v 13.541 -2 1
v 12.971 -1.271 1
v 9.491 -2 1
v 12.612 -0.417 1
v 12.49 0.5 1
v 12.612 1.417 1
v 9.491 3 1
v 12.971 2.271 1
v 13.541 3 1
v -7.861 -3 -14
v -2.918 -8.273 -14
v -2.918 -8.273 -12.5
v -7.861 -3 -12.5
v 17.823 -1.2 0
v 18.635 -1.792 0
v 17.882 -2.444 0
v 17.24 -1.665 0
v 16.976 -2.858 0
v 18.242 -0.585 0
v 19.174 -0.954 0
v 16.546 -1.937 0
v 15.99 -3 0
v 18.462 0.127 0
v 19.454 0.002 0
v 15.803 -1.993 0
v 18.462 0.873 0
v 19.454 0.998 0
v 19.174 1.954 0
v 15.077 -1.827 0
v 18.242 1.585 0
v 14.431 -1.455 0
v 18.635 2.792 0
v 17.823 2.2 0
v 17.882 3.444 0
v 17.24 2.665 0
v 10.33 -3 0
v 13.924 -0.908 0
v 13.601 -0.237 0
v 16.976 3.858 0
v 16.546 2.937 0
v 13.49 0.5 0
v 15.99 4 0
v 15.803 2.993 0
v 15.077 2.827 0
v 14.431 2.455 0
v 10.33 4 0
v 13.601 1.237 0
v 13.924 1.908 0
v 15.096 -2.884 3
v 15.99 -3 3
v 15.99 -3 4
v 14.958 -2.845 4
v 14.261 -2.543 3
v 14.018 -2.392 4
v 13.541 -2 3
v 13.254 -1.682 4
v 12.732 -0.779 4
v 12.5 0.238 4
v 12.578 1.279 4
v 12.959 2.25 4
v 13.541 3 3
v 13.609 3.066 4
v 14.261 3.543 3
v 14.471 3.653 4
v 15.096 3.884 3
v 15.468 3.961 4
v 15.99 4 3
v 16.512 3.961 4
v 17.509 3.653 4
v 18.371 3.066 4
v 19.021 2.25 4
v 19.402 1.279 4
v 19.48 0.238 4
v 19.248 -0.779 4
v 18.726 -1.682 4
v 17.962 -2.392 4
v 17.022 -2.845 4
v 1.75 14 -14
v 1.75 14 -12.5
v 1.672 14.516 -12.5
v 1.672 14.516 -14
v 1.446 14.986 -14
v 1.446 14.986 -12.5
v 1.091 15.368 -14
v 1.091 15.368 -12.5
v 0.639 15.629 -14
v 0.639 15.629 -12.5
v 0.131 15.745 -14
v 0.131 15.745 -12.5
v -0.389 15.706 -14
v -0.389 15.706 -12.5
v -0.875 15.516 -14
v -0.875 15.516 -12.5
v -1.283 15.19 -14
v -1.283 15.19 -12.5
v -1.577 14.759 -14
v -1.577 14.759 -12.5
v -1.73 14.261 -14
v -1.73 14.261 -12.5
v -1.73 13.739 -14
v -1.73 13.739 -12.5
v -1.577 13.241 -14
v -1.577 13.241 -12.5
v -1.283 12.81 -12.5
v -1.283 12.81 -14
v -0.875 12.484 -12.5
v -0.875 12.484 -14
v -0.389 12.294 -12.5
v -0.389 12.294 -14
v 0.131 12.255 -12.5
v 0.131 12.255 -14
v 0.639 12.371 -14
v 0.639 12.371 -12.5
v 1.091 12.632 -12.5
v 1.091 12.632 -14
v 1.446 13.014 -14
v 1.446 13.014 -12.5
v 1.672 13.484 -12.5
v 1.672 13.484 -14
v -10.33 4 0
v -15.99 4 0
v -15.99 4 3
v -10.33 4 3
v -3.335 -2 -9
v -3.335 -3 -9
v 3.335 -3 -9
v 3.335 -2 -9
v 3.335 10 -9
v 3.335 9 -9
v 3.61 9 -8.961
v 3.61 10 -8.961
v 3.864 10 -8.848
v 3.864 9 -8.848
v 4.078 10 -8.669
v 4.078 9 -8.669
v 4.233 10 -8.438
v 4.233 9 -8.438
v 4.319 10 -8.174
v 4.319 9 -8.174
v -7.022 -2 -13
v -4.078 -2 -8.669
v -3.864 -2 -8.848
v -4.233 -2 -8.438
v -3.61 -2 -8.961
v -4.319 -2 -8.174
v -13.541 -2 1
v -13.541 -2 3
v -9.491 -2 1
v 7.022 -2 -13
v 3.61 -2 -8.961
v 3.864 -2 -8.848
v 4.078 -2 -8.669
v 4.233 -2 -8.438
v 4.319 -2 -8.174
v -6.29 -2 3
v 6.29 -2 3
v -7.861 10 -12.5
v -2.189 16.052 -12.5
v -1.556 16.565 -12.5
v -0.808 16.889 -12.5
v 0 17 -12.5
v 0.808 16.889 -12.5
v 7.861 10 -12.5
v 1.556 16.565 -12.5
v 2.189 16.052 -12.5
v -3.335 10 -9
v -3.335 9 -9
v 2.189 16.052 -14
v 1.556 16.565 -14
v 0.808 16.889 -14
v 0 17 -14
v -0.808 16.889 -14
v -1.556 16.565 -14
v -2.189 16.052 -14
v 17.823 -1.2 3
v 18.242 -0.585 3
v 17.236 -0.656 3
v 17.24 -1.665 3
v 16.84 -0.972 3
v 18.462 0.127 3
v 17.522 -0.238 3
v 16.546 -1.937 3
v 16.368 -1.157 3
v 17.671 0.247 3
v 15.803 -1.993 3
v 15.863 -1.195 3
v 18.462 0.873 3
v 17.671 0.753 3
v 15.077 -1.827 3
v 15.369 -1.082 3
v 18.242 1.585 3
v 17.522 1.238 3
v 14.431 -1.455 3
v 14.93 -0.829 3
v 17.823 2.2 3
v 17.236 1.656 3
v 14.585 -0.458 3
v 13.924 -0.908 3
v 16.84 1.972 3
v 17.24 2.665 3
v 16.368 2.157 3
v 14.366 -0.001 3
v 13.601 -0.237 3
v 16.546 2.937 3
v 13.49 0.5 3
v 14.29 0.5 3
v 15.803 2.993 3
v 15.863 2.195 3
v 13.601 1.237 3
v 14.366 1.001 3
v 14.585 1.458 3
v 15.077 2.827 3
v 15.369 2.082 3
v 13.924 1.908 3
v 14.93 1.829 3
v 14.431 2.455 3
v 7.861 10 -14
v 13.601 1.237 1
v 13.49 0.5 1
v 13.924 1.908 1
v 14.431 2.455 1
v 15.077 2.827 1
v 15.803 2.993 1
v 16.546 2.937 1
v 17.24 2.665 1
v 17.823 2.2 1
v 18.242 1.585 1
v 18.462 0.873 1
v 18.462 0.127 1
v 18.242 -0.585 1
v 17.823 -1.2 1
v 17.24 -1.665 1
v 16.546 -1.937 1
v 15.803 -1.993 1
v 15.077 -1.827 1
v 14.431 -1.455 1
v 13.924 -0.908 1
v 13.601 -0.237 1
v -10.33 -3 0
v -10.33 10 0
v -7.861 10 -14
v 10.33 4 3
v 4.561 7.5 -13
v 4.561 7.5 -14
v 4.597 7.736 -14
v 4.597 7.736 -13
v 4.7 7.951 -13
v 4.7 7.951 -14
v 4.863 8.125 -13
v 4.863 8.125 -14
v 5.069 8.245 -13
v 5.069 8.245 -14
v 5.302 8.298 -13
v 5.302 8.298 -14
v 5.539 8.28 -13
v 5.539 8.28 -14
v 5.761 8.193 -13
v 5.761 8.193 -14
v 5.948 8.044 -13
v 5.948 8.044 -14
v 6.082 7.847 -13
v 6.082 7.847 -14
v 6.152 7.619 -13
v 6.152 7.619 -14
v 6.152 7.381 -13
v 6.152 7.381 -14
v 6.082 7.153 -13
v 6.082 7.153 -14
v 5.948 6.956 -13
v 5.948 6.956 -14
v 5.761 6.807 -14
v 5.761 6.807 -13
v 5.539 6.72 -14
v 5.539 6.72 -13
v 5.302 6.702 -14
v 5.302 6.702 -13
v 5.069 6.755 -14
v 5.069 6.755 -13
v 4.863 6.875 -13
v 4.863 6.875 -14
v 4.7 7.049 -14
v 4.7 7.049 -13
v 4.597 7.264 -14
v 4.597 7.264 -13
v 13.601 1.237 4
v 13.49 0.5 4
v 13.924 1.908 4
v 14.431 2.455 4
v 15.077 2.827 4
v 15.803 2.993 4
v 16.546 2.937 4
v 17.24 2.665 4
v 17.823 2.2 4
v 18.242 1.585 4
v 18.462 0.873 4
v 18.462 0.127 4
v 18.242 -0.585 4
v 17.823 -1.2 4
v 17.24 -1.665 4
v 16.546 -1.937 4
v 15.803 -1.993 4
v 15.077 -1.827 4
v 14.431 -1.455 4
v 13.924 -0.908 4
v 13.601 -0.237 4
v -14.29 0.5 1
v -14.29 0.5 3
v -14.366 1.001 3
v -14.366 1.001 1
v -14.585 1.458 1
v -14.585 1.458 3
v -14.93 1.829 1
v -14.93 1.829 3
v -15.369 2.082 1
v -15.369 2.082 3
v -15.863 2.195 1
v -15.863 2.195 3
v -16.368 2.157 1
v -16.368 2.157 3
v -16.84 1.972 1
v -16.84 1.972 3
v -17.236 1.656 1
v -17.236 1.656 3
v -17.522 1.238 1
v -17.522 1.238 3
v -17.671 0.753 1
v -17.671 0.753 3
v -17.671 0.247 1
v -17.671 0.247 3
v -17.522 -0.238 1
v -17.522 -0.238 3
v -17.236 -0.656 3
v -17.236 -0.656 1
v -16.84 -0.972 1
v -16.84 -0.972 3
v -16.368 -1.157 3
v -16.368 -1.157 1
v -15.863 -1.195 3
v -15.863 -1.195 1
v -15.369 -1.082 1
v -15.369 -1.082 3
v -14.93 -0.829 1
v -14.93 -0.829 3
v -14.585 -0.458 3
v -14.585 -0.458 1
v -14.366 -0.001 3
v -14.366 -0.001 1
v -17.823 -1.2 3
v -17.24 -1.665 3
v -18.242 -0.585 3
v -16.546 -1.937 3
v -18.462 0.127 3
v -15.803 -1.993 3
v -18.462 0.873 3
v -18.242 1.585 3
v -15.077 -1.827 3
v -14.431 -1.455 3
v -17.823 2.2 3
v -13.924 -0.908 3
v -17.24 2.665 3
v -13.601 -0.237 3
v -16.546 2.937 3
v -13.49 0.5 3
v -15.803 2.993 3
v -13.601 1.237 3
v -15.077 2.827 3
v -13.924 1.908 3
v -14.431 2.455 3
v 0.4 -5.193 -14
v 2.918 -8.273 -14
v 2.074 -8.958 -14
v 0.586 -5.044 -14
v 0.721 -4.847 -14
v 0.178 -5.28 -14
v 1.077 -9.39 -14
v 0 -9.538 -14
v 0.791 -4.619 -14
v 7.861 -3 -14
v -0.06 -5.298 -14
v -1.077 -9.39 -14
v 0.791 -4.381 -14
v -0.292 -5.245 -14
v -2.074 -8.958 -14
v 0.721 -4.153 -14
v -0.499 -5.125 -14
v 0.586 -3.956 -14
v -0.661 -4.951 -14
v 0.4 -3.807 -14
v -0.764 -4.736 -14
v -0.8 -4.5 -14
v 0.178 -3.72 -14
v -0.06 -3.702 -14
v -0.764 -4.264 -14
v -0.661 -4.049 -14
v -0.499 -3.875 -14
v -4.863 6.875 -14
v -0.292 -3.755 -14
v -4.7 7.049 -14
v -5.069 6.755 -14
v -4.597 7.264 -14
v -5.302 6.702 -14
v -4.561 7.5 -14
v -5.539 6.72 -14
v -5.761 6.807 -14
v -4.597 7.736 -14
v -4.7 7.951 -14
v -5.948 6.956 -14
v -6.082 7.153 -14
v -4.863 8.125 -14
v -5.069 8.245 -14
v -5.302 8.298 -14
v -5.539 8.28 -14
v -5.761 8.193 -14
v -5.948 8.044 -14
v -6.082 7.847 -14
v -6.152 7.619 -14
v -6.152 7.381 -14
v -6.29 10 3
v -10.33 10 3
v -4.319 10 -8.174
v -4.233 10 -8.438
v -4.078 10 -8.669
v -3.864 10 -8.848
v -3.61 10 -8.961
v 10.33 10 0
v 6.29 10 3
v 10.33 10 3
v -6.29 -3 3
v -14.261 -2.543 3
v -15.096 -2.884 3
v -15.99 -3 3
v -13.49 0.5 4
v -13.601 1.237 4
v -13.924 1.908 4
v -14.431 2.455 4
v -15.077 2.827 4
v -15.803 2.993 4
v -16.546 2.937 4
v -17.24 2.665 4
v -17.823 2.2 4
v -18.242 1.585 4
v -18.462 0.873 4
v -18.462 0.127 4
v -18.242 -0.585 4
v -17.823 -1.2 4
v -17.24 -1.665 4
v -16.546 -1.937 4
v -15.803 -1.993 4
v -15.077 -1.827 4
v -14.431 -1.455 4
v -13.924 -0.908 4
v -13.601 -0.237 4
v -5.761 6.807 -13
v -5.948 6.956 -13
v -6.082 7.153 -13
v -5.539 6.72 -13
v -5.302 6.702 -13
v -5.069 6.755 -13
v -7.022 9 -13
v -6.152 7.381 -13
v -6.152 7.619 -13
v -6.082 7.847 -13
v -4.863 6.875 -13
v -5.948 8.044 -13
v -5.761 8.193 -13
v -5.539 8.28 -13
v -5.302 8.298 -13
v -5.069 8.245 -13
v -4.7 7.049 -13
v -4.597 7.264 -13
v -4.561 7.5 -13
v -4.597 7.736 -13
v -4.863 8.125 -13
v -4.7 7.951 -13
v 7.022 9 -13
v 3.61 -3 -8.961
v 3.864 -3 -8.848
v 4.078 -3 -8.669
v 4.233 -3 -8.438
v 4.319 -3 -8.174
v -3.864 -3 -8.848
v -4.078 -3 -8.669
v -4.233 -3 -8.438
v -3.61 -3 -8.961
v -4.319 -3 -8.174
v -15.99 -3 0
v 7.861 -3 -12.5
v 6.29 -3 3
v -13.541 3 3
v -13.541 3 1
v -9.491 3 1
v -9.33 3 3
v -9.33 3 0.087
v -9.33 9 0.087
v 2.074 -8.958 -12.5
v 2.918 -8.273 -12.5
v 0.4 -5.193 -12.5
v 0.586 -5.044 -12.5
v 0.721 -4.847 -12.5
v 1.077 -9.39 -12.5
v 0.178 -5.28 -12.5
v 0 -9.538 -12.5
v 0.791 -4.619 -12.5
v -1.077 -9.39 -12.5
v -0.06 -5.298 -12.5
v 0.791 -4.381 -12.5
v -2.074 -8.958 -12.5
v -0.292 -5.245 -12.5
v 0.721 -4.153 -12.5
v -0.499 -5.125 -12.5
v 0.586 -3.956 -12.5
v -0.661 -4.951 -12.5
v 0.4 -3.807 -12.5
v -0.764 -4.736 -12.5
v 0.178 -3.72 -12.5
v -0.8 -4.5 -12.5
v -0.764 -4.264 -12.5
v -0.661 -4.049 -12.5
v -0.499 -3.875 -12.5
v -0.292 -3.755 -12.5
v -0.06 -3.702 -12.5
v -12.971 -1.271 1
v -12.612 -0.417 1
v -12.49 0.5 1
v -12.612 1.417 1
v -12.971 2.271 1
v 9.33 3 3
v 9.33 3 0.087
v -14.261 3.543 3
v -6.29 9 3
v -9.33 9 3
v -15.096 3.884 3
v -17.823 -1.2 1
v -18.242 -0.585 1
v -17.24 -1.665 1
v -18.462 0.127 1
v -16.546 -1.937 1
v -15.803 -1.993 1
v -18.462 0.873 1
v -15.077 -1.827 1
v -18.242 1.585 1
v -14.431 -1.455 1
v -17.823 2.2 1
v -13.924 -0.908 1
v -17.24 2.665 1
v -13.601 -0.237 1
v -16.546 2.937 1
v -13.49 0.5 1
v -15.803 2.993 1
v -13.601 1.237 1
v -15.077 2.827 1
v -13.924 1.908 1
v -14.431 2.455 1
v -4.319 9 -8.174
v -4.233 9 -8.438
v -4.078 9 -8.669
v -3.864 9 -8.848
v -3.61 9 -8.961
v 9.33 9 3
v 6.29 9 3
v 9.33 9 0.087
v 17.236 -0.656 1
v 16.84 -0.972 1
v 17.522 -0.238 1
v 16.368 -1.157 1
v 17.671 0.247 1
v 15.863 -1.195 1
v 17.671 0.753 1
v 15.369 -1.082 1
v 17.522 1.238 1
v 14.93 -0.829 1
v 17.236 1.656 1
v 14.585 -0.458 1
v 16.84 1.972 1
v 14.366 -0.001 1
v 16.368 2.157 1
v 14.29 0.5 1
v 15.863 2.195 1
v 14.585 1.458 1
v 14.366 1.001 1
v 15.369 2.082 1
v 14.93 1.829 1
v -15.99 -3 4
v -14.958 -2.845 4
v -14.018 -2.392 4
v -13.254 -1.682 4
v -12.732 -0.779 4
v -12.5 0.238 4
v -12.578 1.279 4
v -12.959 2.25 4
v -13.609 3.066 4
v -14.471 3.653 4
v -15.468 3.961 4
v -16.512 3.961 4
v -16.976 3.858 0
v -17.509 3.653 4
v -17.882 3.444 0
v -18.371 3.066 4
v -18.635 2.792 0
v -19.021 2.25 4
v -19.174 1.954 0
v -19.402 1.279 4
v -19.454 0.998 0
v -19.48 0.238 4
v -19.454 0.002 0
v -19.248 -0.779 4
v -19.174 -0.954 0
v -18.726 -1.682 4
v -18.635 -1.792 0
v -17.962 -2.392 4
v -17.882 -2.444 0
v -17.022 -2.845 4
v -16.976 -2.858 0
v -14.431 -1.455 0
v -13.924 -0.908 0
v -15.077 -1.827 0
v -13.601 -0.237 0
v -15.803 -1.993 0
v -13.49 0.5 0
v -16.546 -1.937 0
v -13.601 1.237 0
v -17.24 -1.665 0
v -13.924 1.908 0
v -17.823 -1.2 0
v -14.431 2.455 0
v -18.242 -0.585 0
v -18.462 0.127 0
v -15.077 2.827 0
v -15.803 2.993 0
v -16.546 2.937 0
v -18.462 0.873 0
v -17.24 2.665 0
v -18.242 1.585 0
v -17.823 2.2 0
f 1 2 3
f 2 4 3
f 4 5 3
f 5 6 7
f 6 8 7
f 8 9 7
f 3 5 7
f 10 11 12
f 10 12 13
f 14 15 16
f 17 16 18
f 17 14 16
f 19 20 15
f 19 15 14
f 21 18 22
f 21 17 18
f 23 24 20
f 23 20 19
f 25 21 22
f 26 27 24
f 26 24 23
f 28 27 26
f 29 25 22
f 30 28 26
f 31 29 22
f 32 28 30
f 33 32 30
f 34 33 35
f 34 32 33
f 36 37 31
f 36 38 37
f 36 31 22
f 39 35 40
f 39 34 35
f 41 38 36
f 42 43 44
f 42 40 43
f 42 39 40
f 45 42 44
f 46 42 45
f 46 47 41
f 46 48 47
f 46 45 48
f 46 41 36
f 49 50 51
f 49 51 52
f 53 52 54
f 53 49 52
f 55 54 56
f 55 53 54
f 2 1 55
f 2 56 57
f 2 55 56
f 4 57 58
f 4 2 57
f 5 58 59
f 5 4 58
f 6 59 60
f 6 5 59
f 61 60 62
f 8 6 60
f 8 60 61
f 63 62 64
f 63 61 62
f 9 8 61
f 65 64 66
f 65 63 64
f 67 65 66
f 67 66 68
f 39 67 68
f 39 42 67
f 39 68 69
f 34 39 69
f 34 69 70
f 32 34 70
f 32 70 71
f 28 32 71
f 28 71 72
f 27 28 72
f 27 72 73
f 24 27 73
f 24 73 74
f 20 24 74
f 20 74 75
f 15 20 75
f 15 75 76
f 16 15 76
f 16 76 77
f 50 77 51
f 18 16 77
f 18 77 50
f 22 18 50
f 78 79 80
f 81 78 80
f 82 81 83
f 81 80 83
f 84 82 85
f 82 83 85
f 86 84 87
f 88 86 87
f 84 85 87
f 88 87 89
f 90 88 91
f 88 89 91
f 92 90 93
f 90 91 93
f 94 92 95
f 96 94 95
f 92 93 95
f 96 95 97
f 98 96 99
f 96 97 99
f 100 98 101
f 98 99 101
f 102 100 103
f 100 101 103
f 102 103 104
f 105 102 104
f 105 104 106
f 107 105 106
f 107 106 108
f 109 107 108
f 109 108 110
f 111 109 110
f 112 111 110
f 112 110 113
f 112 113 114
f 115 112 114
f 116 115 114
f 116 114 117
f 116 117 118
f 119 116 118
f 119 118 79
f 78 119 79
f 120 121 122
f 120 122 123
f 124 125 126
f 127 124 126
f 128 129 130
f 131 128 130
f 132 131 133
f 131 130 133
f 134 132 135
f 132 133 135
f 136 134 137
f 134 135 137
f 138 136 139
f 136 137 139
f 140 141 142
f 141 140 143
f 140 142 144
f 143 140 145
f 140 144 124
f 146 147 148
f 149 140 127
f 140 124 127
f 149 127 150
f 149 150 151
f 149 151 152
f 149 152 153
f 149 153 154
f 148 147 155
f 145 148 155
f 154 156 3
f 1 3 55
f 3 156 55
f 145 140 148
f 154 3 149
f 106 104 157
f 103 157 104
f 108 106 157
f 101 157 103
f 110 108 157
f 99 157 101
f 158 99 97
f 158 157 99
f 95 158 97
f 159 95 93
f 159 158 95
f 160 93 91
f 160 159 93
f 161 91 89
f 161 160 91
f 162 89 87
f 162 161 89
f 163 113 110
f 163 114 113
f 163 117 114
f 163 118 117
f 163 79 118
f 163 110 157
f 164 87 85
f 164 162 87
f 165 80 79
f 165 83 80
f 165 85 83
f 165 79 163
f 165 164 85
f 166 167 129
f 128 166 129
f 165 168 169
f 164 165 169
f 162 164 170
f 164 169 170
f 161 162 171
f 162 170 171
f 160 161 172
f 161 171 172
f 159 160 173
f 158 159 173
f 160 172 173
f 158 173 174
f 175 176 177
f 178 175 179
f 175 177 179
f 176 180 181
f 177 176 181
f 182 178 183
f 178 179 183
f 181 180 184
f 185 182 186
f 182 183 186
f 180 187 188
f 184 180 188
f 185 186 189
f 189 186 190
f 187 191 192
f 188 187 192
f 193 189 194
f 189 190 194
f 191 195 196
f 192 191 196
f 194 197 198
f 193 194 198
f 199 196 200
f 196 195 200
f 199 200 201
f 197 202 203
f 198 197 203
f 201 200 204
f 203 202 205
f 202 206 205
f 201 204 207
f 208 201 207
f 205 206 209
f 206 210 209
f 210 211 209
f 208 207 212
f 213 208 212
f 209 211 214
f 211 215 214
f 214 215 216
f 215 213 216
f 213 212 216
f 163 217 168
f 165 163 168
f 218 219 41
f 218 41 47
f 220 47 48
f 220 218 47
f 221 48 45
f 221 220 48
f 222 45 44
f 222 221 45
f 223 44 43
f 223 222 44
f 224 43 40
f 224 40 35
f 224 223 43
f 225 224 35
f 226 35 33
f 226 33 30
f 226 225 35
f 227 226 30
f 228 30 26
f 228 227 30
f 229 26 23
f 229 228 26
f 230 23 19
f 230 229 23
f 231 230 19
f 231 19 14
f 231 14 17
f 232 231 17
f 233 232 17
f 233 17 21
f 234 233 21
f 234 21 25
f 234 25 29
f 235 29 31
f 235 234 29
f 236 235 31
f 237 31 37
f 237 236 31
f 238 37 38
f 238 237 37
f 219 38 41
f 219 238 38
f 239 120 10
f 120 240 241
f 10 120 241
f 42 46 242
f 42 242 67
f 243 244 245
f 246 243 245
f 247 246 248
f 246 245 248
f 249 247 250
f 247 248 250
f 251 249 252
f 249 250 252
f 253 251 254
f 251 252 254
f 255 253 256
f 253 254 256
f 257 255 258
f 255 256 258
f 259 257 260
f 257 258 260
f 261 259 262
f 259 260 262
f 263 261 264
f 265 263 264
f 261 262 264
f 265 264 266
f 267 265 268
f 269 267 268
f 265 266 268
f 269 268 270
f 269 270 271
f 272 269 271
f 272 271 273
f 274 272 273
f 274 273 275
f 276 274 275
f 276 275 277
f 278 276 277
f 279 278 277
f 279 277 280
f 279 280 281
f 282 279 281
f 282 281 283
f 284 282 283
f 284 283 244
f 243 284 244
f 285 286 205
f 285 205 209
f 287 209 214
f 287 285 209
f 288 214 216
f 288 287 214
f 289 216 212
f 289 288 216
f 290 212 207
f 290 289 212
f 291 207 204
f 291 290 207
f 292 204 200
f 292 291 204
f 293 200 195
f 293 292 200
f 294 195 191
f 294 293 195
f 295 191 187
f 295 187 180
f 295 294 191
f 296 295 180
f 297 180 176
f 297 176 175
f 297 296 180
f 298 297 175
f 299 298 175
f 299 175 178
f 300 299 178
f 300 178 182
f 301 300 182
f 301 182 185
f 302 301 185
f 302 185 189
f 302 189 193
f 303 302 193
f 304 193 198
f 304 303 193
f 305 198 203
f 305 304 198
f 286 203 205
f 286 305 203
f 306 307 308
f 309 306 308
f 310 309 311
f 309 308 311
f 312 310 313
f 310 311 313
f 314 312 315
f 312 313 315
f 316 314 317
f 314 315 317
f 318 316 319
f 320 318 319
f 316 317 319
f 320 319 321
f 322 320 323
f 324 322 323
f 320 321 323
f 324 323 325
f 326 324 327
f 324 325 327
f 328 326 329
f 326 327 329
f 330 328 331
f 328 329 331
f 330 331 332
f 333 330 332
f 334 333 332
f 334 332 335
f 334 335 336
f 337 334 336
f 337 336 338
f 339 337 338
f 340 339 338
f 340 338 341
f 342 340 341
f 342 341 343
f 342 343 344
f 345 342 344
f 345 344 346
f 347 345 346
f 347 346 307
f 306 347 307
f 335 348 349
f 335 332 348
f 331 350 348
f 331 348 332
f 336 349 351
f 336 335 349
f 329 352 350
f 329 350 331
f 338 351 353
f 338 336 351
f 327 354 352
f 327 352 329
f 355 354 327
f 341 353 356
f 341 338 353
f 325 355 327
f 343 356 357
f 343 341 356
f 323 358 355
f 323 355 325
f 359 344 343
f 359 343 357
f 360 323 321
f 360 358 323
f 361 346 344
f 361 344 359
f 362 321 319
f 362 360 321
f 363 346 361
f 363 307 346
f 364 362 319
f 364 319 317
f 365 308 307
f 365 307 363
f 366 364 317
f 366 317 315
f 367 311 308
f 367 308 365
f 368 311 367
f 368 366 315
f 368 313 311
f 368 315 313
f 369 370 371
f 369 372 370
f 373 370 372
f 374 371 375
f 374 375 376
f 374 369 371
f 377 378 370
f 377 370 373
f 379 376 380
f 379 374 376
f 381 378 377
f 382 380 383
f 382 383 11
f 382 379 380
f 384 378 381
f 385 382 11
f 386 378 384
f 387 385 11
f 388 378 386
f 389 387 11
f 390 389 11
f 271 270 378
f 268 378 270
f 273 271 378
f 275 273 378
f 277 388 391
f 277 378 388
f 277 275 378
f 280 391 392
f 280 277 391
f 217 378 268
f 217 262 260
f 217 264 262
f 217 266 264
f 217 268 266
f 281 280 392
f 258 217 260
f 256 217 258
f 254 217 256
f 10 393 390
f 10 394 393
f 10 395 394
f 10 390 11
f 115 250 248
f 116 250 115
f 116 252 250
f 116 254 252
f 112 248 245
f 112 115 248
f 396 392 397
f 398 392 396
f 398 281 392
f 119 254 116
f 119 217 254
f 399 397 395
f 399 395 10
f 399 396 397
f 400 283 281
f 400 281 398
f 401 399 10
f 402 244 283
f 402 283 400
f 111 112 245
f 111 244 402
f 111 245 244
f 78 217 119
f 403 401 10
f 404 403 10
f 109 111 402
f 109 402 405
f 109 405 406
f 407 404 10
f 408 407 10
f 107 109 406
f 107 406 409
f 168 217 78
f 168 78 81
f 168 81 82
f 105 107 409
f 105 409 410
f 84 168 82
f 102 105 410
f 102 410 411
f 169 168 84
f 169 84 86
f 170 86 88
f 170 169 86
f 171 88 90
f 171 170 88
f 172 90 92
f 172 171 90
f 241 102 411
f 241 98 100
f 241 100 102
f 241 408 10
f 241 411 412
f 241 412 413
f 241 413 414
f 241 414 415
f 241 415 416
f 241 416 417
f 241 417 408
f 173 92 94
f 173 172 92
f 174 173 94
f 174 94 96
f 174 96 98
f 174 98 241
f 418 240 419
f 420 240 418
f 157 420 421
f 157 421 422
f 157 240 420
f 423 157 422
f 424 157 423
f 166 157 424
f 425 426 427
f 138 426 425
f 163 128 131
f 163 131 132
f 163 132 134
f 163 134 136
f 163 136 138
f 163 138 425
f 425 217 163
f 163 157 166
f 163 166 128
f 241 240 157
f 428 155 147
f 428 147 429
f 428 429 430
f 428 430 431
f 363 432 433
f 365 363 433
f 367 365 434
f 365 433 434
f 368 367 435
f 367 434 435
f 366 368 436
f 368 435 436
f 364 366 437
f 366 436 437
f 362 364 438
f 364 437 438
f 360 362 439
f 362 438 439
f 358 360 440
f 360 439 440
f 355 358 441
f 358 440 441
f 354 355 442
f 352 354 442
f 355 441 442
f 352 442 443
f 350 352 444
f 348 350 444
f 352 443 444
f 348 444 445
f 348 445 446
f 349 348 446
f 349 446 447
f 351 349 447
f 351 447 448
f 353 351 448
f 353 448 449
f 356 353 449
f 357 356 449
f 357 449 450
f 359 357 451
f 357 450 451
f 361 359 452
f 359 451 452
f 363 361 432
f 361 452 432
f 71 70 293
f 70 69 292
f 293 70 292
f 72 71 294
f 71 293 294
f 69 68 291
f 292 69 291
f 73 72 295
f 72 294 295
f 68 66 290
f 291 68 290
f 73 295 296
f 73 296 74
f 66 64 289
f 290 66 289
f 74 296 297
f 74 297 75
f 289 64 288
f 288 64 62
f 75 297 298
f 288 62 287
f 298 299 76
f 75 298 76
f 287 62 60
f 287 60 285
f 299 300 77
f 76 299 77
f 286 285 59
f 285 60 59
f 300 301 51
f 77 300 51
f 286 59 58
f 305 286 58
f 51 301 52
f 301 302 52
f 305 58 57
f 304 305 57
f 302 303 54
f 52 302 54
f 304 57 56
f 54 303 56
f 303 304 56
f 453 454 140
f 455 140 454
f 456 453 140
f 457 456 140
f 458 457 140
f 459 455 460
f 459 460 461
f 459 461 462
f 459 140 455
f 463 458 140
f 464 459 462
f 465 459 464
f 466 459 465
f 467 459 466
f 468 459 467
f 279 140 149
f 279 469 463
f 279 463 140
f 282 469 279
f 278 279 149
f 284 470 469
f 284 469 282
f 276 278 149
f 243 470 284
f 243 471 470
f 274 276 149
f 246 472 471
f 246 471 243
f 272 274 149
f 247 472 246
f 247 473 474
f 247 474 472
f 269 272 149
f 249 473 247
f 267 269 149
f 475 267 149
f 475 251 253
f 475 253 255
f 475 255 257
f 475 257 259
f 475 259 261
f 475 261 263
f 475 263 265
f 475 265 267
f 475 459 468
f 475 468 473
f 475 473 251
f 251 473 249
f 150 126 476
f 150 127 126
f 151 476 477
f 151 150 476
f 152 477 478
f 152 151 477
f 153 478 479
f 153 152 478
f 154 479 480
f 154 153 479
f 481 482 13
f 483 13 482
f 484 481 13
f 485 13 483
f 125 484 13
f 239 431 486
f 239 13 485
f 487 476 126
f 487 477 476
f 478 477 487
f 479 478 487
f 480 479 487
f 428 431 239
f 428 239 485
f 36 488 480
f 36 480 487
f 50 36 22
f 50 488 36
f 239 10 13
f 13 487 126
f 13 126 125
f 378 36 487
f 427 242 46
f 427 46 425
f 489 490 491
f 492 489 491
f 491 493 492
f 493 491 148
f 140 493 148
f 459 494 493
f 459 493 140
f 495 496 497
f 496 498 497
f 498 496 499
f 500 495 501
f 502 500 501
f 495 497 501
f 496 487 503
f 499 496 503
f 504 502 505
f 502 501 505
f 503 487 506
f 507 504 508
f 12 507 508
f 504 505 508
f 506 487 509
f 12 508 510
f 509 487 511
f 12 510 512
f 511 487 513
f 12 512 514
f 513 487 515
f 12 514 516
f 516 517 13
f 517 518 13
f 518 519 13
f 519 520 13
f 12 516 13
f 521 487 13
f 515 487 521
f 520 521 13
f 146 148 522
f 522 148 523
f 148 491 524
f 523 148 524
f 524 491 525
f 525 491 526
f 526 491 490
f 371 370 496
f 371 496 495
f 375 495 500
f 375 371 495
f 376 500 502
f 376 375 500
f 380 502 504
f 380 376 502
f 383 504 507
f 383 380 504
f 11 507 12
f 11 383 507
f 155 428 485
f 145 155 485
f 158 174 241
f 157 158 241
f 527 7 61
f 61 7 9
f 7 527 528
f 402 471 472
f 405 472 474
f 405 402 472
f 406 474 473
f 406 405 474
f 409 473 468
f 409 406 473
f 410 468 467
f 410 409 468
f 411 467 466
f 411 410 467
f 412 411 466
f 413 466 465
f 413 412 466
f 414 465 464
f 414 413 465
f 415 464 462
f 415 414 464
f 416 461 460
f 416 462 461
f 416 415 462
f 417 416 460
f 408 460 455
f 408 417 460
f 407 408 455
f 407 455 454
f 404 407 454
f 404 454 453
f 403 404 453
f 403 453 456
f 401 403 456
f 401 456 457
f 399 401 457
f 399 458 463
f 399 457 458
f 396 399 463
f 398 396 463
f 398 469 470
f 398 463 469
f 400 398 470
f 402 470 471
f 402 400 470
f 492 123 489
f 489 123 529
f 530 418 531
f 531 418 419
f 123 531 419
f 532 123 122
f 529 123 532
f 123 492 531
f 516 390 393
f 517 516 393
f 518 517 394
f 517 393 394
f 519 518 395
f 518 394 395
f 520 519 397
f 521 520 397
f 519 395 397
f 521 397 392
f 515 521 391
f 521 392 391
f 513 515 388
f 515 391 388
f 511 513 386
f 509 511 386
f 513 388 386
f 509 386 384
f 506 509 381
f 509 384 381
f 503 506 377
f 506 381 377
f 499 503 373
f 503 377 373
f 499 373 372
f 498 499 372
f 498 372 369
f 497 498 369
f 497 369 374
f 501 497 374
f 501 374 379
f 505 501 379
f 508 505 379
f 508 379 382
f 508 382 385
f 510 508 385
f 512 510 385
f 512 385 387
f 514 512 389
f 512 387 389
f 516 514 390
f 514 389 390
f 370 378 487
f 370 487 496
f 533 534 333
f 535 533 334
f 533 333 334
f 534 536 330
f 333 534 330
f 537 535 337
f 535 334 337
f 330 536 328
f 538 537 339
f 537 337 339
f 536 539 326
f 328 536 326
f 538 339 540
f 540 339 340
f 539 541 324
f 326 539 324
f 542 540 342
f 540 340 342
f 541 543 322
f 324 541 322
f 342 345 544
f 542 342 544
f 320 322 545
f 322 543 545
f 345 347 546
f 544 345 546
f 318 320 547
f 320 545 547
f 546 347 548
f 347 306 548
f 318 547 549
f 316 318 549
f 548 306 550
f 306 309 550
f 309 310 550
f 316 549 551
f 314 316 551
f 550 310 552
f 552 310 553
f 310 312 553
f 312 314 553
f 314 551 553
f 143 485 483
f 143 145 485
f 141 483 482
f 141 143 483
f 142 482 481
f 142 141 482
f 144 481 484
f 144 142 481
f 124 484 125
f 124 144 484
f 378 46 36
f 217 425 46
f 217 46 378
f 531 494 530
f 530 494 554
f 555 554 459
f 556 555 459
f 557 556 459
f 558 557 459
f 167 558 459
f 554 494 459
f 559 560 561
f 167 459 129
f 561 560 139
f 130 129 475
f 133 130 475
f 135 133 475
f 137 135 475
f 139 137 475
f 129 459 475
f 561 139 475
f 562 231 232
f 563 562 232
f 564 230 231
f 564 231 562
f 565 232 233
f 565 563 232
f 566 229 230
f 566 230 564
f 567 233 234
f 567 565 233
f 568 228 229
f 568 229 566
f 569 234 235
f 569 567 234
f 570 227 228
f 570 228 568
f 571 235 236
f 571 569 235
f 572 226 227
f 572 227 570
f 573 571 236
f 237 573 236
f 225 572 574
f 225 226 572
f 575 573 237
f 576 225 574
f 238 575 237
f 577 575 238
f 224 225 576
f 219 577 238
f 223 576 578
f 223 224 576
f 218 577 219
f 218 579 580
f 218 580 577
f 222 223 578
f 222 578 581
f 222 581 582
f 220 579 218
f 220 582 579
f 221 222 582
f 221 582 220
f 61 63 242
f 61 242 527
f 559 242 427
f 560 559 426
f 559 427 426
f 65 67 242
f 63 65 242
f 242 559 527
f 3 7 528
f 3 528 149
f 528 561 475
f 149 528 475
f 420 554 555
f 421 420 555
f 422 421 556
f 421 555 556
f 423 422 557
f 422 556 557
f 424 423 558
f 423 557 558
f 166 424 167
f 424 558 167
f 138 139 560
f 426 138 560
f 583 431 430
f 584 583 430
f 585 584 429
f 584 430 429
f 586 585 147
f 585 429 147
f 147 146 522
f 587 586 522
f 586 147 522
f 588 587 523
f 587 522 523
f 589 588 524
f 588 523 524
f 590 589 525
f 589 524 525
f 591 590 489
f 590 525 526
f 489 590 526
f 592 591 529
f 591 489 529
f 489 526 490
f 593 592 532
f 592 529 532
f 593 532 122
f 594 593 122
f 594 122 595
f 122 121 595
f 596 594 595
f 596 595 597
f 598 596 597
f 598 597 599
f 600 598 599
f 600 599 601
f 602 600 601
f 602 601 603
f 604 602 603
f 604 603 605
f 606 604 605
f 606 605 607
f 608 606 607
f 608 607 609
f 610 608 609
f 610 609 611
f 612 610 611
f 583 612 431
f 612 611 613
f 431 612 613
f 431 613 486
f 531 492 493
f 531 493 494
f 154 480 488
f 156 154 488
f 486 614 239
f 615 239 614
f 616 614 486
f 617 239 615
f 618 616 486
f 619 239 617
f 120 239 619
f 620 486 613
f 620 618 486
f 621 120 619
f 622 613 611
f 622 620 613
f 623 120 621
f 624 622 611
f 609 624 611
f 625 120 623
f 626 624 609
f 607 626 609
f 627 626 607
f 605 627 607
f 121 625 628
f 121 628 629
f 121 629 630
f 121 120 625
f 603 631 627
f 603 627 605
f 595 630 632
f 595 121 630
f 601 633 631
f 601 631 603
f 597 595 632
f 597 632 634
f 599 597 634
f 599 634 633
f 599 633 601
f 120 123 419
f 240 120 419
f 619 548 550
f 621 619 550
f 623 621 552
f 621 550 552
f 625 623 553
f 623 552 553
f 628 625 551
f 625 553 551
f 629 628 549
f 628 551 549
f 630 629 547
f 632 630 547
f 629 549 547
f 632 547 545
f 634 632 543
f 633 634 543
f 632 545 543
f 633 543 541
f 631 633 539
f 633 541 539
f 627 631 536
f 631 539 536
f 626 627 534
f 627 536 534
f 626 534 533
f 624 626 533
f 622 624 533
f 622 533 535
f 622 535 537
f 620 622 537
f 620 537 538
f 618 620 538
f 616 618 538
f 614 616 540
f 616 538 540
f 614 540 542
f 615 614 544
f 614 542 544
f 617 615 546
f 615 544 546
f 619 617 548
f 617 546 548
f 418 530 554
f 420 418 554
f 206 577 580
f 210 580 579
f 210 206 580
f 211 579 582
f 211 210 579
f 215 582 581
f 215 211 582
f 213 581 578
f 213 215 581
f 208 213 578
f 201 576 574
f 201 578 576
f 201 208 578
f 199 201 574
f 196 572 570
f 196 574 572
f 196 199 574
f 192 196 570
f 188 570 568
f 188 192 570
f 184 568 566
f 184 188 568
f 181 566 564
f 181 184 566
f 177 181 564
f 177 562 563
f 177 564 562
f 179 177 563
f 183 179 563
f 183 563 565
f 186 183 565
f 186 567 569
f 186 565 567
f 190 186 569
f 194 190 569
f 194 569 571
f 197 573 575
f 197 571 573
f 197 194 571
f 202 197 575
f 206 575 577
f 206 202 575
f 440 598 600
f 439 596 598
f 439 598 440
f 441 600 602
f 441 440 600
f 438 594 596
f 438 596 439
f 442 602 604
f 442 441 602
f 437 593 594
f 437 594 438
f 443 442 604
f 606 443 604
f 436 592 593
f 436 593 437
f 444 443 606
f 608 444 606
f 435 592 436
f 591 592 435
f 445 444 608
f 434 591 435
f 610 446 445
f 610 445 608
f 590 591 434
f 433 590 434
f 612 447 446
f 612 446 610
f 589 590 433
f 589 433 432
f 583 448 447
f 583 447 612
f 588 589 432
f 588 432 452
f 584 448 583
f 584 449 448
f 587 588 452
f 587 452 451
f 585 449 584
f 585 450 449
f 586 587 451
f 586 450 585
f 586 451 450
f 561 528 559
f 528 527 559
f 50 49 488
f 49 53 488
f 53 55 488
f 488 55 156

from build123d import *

# Parameters (mm, degrees)
ESTRUSIONE_ESTRUSIONE1_DEPTH = 3
SCHIZZO2_W                   = 20.66
SCHIZZO2_H                   = 13
ESTRUSIONE_ESTRUSIONE2_DEPTH = 14
TAGLIO_ESTRUSIONE1_DEPTH     = 25.91345219
SVUOTA1_T                    = -1
SCHIZZO4_R                   = 3.5
ESTRUSIONE_ESTRUSIONE3_DEPTH = 4
SCHIZZO5_R                   = 2.5
TAGLIO_ESTRUSIONE2_DEPTH     = 1
SCHIZZO6_R                   = 1.7
TAGLIO_ESTRUSIONE3_DEPTH     = 28.728326671
ESTRUSIONE_ESTRUSIONE4_DEPTH = 1.5
SCHIZZO8_R                   = 1.75
TAGLIO_ESTRUSIONE4_DEPTH     = 31.677517827
SCHIZZO9_R                   = 0.8
TAGLIO_ESTRUSIONE5_DEPTH     = 1.5
TAGLIO_ESTRUSIONE6_DEPTH     = 32.238759578
RACCORDO1_R                  = 1
SPECCHIA12_START             = 9
SPECCHIA12_DEPTH             = 1
RACCORDO2_R                  = 1
SPECCHIA15_START             = 9
SPECCHIA15_DEPTH             = 1
SCHIZZO12_R                  = 0.8
ESTRUSIONE_ESTRUSIONE5_DEPTH = 1.5
TAGLIO_ESTRUSIONE7_START     = -1
SCHIZZO13_R                  = 2.5
TAGLIO_ESTRUSIONE7_DEPTH     = 1


# Read off the part's stored shape, not the designer's step: Specchia12, Specchia15
with BuildPart() as part:
    # Schizzo1 → Estrusione-Estrusione1 (new body)
    with BuildSketch(Plane.XY):
        Polygon((-15.99, 4), (-10.33, 4), (-10.33, 10), (10.33, 10), (10.33, 4), (15.99, 4), (15.99, -3), (-15.99, -3), align=None)
    extrude(amount=ESTRUSIONE_ESTRUSIONE1_DEPTH)

    # Schizzo2 → Estrusione-Estrusione2 (add)
    with BuildSketch(Plane.XY):
        with Locations((0, 3.5)):
            Rectangle(SCHIZZO2_W, SCHIZZO2_H)
    extrude(amount=-ESTRUSIONE_ESTRUSIONE2_DEPTH)

    # Schizzo3 → Taglio-Estrusione1 (cut, through all)
    with BuildSketch(Plane(origin=(0, 10, 0), x_dir=(1, 0, 0), z_dir=(0, 1, 0))):
        Polygon((-10.33, 0), (-7.86142227, 14), (-10.33, 14), align=None)
    taglio_estrusione1 = extrude(amount=-TAGLIO_ESTRUSIONE1_DEPTH, mode=Mode.SUBTRACT)

    # Specchia1: Taglio-Estrusione1 across plane
    add(taglio_estrusione1.mirror(Plane(origin=(0, 0, 0), x_dir=(0, 0, 1), z_dir=(1, 0, 0))), mode=Mode.SUBTRACT)

    # Svuota1
    svuota1_openings = [part.faces().sort_by_distance(p)[0] for p in [
        (0, 2.81654304, 3),
    ]]
    offset(amount=SVUOTA1_T, openings=svuota1_openings, kind=Kind.INTERSECTION)

    # Schizzo4 → Estrusione-Estrusione3 (add)
    with BuildSketch(Plane.XY):
        with Locations(Location((-15.99, 0.5, 0), (0, 0, 270))):
            Circle(SCHIZZO4_R)
    estrusione_estrusione3 = extrude(amount=ESTRUSIONE_ESTRUSIONE3_DEPTH)

    # Schizzo5 → Taglio-Estrusione2 (cut)
    with BuildSketch(Plane.XY.offset(4)):
        with Locations((-15.99, 0.5)):
            Circle(SCHIZZO5_R)
    taglio_estrusione2 = extrude(amount=-TAGLIO_ESTRUSIONE2_DEPTH, mode=Mode.SUBTRACT)

    # Schizzo6 → Taglio-Estrusione3 (cut, through all)
    with BuildSketch(Plane.XY.offset(3)):
        with Locations((-15.99, 0.5)):
            Circle(SCHIZZO6_R)
    taglio_estrusione3 = extrude(amount=-TAGLIO_ESTRUSIONE3_DEPTH, mode=Mode.SUBTRACT)

    # Specchia2: Estrusione-Estrusione3, Taglio-Estrusione2, Taglio-Estrusione3 across plane
    add(estrusione_estrusione3.mirror(Plane(origin=(0, 0, 0), x_dir=(0, 0, 1), z_dir=(1, 0, 0))))
    add(taglio_estrusione2.mirror(Plane(origin=(0, 0, 0), x_dir=(0, 0, 1), z_dir=(1, 0, 0))), mode=Mode.SUBTRACT)
    add(taglio_estrusione3.mirror(Plane(origin=(0, 0, 0), x_dir=(0, 0, 1), z_dir=(1, 0, 0))), mode=Mode.SUBTRACT)

    # Schizzo7 → Estrusione-Estrusione4 (add)
    with BuildSketch(Plane(origin=(0, 0, -14), x_dir=(-1, 0, 0), z_dir=(0, 0, -1))):
        with BuildLine():
            Line((-7.86142227, 10), (-2.188751242, 16.051674439))
            ThreePointArc((-2.188751242, 16.051674439), (0, 17), (2.188751242, 16.051674439))
            Line((2.188751242, 16.051674439), (7.86142227, 10))
            Line((7.86142227, 10), (-7.86142227, 10))
        make_face()
    extrude(amount=-ESTRUSIONE_ESTRUSIONE4_DEPTH)

    # Schizzo8 → Taglio-Estrusione4 (cut, through all)
    with BuildSketch(Plane.XY.offset(-12.5)):
        with Locations((0, 14)):
            Circle(SCHIZZO8_R)
    extrude(amount=-TAGLIO_ESTRUSIONE4_DEPTH, mode=Mode.SUBTRACT)

    # Schizzo9 → Taglio-Estrusione5 (cut)
    with BuildSketch(Plane(origin=(0, 0, -14), x_dir=(-1, 0, 0), z_dir=(0, 0, -1))):
        with Locations((-5.36142227, 7.5)):
            Circle(SCHIZZO9_R)
    taglio_estrusione5 = extrude(amount=-TAGLIO_ESTRUSIONE5_DEPTH, mode=Mode.SUBTRACT)

    # Specchia5: Taglio-Estrusione5 across plane
    add(taglio_estrusione5.mirror(Plane(origin=(0, 0, 0), x_dir=(0, 0, 1), z_dir=(1, 0, 0))), mode=Mode.SUBTRACT)

    # Schizzo10 → Taglio-Estrusione6 (cut, through all)
    with BuildSketch(Plane.XZ.offset(3)):
        Polygon((-6.289561189, 3), (-4.17363742, -9), (4.17363742, -9), (6.289561189, 3), align=None)
    extrude(amount=-TAGLIO_ESTRUSIONE6_DEPTH, mode=Mode.SUBTRACT)

    # Raccordo1
    raccordo1_edges = [part.edges().sort_by_distance(p)[0] for p in [
        (-4.17363742, -2.5, -9),
    ]]
    fillet(raccordo1_edges, radius=RACCORDO1_R)

    # Specchia12 outline → Specchia12 (add)
    with BuildSketch(Plane(origin=(0, 0, 0), x_dir=(1, 0, 0), z_dir=(0, 1, 0)).offset(SPECCHIA12_START)):
        with BuildLine():
            ThreePointArc((-4.319345542, 8.173648178), (-3.977325399, 8.766044443), (-3.334537789, 9))
            Line((-3.334537789, 9), (-4.17363742, 9))
            Line((-4.17363742, 9), (-4.319345542, 8.173648178))
        make_face()
    extrude(amount=SPECCHIA12_DEPTH)

    # Raccordo2
    raccordo2_edges = [part.edges().sort_by_distance(p)[0] for p in [
        (4.17363742, -2.5, -9),
    ]]
    fillet(raccordo2_edges, radius=RACCORDO2_R)

    # Specchia15 outline → Specchia15 (add)
    with BuildSketch(Plane(origin=(0, 0, 0), x_dir=(1, 0, 0), z_dir=(0, 1, 0)).offset(SPECCHIA15_START)):
        with BuildLine():
            ThreePointArc((3.334537789, 9), (3.977325399, 8.766044443), (4.319345542, 8.173648178))
            Line((4.319345542, 8.173648178), (4.17363742, 9))
            Line((4.17363742, 9), (3.334537789, 9))
        make_face()
    extrude(amount=SPECCHIA15_DEPTH)

    # Schizzo12 → Estrusione-Estrusione5 (add)
    with BuildSketch(Plane(origin=(0, 0, -14), x_dir=(-1, 0, 0), z_dir=(0, 0, -1))):
        with BuildLine():
            Line((-7.86142227, -3), (-2.918334989, -8.273345625))
            ThreePointArc((-2.918334989, -8.273345625), (0, -9.537779706), (2.918334989, -8.273345625))
            Line((2.918334989, -8.273345625), (7.86142227, -3))
            Line((7.86142227, -3), (-7.86142227, -3))
        make_face()
        with Locations((0, -4.5)):
            Circle(SCHIZZO12_R, mode=Mode.SUBTRACT)
    extrude(amount=-ESTRUSIONE_ESTRUSIONE5_DEPTH)

    # Schizzo13 → Taglio-Estrusione7 (cut)
    with BuildSketch(Plane(origin=(0, 0, 0), x_dir=(-1, 0, 0), z_dir=(0, 0, -1)).offset(TAGLIO_ESTRUSIONE7_START)):
        with Locations((-15.99, 0.5)):
            Circle(SCHIZZO13_R)
    taglio_estrusione7 = extrude(amount=TAGLIO_ESTRUSIONE7_DEPTH, mode=Mode.SUBTRACT)

    # Specchia16: Taglio-Estrusione7 across plane
    add(taglio_estrusione7.mirror(Plane(origin=(0, 0, 0), x_dir=(0, 0, 1), z_dir=(1, 0, 0))), mode=Mode.SUBTRACT)


solid = part.part
